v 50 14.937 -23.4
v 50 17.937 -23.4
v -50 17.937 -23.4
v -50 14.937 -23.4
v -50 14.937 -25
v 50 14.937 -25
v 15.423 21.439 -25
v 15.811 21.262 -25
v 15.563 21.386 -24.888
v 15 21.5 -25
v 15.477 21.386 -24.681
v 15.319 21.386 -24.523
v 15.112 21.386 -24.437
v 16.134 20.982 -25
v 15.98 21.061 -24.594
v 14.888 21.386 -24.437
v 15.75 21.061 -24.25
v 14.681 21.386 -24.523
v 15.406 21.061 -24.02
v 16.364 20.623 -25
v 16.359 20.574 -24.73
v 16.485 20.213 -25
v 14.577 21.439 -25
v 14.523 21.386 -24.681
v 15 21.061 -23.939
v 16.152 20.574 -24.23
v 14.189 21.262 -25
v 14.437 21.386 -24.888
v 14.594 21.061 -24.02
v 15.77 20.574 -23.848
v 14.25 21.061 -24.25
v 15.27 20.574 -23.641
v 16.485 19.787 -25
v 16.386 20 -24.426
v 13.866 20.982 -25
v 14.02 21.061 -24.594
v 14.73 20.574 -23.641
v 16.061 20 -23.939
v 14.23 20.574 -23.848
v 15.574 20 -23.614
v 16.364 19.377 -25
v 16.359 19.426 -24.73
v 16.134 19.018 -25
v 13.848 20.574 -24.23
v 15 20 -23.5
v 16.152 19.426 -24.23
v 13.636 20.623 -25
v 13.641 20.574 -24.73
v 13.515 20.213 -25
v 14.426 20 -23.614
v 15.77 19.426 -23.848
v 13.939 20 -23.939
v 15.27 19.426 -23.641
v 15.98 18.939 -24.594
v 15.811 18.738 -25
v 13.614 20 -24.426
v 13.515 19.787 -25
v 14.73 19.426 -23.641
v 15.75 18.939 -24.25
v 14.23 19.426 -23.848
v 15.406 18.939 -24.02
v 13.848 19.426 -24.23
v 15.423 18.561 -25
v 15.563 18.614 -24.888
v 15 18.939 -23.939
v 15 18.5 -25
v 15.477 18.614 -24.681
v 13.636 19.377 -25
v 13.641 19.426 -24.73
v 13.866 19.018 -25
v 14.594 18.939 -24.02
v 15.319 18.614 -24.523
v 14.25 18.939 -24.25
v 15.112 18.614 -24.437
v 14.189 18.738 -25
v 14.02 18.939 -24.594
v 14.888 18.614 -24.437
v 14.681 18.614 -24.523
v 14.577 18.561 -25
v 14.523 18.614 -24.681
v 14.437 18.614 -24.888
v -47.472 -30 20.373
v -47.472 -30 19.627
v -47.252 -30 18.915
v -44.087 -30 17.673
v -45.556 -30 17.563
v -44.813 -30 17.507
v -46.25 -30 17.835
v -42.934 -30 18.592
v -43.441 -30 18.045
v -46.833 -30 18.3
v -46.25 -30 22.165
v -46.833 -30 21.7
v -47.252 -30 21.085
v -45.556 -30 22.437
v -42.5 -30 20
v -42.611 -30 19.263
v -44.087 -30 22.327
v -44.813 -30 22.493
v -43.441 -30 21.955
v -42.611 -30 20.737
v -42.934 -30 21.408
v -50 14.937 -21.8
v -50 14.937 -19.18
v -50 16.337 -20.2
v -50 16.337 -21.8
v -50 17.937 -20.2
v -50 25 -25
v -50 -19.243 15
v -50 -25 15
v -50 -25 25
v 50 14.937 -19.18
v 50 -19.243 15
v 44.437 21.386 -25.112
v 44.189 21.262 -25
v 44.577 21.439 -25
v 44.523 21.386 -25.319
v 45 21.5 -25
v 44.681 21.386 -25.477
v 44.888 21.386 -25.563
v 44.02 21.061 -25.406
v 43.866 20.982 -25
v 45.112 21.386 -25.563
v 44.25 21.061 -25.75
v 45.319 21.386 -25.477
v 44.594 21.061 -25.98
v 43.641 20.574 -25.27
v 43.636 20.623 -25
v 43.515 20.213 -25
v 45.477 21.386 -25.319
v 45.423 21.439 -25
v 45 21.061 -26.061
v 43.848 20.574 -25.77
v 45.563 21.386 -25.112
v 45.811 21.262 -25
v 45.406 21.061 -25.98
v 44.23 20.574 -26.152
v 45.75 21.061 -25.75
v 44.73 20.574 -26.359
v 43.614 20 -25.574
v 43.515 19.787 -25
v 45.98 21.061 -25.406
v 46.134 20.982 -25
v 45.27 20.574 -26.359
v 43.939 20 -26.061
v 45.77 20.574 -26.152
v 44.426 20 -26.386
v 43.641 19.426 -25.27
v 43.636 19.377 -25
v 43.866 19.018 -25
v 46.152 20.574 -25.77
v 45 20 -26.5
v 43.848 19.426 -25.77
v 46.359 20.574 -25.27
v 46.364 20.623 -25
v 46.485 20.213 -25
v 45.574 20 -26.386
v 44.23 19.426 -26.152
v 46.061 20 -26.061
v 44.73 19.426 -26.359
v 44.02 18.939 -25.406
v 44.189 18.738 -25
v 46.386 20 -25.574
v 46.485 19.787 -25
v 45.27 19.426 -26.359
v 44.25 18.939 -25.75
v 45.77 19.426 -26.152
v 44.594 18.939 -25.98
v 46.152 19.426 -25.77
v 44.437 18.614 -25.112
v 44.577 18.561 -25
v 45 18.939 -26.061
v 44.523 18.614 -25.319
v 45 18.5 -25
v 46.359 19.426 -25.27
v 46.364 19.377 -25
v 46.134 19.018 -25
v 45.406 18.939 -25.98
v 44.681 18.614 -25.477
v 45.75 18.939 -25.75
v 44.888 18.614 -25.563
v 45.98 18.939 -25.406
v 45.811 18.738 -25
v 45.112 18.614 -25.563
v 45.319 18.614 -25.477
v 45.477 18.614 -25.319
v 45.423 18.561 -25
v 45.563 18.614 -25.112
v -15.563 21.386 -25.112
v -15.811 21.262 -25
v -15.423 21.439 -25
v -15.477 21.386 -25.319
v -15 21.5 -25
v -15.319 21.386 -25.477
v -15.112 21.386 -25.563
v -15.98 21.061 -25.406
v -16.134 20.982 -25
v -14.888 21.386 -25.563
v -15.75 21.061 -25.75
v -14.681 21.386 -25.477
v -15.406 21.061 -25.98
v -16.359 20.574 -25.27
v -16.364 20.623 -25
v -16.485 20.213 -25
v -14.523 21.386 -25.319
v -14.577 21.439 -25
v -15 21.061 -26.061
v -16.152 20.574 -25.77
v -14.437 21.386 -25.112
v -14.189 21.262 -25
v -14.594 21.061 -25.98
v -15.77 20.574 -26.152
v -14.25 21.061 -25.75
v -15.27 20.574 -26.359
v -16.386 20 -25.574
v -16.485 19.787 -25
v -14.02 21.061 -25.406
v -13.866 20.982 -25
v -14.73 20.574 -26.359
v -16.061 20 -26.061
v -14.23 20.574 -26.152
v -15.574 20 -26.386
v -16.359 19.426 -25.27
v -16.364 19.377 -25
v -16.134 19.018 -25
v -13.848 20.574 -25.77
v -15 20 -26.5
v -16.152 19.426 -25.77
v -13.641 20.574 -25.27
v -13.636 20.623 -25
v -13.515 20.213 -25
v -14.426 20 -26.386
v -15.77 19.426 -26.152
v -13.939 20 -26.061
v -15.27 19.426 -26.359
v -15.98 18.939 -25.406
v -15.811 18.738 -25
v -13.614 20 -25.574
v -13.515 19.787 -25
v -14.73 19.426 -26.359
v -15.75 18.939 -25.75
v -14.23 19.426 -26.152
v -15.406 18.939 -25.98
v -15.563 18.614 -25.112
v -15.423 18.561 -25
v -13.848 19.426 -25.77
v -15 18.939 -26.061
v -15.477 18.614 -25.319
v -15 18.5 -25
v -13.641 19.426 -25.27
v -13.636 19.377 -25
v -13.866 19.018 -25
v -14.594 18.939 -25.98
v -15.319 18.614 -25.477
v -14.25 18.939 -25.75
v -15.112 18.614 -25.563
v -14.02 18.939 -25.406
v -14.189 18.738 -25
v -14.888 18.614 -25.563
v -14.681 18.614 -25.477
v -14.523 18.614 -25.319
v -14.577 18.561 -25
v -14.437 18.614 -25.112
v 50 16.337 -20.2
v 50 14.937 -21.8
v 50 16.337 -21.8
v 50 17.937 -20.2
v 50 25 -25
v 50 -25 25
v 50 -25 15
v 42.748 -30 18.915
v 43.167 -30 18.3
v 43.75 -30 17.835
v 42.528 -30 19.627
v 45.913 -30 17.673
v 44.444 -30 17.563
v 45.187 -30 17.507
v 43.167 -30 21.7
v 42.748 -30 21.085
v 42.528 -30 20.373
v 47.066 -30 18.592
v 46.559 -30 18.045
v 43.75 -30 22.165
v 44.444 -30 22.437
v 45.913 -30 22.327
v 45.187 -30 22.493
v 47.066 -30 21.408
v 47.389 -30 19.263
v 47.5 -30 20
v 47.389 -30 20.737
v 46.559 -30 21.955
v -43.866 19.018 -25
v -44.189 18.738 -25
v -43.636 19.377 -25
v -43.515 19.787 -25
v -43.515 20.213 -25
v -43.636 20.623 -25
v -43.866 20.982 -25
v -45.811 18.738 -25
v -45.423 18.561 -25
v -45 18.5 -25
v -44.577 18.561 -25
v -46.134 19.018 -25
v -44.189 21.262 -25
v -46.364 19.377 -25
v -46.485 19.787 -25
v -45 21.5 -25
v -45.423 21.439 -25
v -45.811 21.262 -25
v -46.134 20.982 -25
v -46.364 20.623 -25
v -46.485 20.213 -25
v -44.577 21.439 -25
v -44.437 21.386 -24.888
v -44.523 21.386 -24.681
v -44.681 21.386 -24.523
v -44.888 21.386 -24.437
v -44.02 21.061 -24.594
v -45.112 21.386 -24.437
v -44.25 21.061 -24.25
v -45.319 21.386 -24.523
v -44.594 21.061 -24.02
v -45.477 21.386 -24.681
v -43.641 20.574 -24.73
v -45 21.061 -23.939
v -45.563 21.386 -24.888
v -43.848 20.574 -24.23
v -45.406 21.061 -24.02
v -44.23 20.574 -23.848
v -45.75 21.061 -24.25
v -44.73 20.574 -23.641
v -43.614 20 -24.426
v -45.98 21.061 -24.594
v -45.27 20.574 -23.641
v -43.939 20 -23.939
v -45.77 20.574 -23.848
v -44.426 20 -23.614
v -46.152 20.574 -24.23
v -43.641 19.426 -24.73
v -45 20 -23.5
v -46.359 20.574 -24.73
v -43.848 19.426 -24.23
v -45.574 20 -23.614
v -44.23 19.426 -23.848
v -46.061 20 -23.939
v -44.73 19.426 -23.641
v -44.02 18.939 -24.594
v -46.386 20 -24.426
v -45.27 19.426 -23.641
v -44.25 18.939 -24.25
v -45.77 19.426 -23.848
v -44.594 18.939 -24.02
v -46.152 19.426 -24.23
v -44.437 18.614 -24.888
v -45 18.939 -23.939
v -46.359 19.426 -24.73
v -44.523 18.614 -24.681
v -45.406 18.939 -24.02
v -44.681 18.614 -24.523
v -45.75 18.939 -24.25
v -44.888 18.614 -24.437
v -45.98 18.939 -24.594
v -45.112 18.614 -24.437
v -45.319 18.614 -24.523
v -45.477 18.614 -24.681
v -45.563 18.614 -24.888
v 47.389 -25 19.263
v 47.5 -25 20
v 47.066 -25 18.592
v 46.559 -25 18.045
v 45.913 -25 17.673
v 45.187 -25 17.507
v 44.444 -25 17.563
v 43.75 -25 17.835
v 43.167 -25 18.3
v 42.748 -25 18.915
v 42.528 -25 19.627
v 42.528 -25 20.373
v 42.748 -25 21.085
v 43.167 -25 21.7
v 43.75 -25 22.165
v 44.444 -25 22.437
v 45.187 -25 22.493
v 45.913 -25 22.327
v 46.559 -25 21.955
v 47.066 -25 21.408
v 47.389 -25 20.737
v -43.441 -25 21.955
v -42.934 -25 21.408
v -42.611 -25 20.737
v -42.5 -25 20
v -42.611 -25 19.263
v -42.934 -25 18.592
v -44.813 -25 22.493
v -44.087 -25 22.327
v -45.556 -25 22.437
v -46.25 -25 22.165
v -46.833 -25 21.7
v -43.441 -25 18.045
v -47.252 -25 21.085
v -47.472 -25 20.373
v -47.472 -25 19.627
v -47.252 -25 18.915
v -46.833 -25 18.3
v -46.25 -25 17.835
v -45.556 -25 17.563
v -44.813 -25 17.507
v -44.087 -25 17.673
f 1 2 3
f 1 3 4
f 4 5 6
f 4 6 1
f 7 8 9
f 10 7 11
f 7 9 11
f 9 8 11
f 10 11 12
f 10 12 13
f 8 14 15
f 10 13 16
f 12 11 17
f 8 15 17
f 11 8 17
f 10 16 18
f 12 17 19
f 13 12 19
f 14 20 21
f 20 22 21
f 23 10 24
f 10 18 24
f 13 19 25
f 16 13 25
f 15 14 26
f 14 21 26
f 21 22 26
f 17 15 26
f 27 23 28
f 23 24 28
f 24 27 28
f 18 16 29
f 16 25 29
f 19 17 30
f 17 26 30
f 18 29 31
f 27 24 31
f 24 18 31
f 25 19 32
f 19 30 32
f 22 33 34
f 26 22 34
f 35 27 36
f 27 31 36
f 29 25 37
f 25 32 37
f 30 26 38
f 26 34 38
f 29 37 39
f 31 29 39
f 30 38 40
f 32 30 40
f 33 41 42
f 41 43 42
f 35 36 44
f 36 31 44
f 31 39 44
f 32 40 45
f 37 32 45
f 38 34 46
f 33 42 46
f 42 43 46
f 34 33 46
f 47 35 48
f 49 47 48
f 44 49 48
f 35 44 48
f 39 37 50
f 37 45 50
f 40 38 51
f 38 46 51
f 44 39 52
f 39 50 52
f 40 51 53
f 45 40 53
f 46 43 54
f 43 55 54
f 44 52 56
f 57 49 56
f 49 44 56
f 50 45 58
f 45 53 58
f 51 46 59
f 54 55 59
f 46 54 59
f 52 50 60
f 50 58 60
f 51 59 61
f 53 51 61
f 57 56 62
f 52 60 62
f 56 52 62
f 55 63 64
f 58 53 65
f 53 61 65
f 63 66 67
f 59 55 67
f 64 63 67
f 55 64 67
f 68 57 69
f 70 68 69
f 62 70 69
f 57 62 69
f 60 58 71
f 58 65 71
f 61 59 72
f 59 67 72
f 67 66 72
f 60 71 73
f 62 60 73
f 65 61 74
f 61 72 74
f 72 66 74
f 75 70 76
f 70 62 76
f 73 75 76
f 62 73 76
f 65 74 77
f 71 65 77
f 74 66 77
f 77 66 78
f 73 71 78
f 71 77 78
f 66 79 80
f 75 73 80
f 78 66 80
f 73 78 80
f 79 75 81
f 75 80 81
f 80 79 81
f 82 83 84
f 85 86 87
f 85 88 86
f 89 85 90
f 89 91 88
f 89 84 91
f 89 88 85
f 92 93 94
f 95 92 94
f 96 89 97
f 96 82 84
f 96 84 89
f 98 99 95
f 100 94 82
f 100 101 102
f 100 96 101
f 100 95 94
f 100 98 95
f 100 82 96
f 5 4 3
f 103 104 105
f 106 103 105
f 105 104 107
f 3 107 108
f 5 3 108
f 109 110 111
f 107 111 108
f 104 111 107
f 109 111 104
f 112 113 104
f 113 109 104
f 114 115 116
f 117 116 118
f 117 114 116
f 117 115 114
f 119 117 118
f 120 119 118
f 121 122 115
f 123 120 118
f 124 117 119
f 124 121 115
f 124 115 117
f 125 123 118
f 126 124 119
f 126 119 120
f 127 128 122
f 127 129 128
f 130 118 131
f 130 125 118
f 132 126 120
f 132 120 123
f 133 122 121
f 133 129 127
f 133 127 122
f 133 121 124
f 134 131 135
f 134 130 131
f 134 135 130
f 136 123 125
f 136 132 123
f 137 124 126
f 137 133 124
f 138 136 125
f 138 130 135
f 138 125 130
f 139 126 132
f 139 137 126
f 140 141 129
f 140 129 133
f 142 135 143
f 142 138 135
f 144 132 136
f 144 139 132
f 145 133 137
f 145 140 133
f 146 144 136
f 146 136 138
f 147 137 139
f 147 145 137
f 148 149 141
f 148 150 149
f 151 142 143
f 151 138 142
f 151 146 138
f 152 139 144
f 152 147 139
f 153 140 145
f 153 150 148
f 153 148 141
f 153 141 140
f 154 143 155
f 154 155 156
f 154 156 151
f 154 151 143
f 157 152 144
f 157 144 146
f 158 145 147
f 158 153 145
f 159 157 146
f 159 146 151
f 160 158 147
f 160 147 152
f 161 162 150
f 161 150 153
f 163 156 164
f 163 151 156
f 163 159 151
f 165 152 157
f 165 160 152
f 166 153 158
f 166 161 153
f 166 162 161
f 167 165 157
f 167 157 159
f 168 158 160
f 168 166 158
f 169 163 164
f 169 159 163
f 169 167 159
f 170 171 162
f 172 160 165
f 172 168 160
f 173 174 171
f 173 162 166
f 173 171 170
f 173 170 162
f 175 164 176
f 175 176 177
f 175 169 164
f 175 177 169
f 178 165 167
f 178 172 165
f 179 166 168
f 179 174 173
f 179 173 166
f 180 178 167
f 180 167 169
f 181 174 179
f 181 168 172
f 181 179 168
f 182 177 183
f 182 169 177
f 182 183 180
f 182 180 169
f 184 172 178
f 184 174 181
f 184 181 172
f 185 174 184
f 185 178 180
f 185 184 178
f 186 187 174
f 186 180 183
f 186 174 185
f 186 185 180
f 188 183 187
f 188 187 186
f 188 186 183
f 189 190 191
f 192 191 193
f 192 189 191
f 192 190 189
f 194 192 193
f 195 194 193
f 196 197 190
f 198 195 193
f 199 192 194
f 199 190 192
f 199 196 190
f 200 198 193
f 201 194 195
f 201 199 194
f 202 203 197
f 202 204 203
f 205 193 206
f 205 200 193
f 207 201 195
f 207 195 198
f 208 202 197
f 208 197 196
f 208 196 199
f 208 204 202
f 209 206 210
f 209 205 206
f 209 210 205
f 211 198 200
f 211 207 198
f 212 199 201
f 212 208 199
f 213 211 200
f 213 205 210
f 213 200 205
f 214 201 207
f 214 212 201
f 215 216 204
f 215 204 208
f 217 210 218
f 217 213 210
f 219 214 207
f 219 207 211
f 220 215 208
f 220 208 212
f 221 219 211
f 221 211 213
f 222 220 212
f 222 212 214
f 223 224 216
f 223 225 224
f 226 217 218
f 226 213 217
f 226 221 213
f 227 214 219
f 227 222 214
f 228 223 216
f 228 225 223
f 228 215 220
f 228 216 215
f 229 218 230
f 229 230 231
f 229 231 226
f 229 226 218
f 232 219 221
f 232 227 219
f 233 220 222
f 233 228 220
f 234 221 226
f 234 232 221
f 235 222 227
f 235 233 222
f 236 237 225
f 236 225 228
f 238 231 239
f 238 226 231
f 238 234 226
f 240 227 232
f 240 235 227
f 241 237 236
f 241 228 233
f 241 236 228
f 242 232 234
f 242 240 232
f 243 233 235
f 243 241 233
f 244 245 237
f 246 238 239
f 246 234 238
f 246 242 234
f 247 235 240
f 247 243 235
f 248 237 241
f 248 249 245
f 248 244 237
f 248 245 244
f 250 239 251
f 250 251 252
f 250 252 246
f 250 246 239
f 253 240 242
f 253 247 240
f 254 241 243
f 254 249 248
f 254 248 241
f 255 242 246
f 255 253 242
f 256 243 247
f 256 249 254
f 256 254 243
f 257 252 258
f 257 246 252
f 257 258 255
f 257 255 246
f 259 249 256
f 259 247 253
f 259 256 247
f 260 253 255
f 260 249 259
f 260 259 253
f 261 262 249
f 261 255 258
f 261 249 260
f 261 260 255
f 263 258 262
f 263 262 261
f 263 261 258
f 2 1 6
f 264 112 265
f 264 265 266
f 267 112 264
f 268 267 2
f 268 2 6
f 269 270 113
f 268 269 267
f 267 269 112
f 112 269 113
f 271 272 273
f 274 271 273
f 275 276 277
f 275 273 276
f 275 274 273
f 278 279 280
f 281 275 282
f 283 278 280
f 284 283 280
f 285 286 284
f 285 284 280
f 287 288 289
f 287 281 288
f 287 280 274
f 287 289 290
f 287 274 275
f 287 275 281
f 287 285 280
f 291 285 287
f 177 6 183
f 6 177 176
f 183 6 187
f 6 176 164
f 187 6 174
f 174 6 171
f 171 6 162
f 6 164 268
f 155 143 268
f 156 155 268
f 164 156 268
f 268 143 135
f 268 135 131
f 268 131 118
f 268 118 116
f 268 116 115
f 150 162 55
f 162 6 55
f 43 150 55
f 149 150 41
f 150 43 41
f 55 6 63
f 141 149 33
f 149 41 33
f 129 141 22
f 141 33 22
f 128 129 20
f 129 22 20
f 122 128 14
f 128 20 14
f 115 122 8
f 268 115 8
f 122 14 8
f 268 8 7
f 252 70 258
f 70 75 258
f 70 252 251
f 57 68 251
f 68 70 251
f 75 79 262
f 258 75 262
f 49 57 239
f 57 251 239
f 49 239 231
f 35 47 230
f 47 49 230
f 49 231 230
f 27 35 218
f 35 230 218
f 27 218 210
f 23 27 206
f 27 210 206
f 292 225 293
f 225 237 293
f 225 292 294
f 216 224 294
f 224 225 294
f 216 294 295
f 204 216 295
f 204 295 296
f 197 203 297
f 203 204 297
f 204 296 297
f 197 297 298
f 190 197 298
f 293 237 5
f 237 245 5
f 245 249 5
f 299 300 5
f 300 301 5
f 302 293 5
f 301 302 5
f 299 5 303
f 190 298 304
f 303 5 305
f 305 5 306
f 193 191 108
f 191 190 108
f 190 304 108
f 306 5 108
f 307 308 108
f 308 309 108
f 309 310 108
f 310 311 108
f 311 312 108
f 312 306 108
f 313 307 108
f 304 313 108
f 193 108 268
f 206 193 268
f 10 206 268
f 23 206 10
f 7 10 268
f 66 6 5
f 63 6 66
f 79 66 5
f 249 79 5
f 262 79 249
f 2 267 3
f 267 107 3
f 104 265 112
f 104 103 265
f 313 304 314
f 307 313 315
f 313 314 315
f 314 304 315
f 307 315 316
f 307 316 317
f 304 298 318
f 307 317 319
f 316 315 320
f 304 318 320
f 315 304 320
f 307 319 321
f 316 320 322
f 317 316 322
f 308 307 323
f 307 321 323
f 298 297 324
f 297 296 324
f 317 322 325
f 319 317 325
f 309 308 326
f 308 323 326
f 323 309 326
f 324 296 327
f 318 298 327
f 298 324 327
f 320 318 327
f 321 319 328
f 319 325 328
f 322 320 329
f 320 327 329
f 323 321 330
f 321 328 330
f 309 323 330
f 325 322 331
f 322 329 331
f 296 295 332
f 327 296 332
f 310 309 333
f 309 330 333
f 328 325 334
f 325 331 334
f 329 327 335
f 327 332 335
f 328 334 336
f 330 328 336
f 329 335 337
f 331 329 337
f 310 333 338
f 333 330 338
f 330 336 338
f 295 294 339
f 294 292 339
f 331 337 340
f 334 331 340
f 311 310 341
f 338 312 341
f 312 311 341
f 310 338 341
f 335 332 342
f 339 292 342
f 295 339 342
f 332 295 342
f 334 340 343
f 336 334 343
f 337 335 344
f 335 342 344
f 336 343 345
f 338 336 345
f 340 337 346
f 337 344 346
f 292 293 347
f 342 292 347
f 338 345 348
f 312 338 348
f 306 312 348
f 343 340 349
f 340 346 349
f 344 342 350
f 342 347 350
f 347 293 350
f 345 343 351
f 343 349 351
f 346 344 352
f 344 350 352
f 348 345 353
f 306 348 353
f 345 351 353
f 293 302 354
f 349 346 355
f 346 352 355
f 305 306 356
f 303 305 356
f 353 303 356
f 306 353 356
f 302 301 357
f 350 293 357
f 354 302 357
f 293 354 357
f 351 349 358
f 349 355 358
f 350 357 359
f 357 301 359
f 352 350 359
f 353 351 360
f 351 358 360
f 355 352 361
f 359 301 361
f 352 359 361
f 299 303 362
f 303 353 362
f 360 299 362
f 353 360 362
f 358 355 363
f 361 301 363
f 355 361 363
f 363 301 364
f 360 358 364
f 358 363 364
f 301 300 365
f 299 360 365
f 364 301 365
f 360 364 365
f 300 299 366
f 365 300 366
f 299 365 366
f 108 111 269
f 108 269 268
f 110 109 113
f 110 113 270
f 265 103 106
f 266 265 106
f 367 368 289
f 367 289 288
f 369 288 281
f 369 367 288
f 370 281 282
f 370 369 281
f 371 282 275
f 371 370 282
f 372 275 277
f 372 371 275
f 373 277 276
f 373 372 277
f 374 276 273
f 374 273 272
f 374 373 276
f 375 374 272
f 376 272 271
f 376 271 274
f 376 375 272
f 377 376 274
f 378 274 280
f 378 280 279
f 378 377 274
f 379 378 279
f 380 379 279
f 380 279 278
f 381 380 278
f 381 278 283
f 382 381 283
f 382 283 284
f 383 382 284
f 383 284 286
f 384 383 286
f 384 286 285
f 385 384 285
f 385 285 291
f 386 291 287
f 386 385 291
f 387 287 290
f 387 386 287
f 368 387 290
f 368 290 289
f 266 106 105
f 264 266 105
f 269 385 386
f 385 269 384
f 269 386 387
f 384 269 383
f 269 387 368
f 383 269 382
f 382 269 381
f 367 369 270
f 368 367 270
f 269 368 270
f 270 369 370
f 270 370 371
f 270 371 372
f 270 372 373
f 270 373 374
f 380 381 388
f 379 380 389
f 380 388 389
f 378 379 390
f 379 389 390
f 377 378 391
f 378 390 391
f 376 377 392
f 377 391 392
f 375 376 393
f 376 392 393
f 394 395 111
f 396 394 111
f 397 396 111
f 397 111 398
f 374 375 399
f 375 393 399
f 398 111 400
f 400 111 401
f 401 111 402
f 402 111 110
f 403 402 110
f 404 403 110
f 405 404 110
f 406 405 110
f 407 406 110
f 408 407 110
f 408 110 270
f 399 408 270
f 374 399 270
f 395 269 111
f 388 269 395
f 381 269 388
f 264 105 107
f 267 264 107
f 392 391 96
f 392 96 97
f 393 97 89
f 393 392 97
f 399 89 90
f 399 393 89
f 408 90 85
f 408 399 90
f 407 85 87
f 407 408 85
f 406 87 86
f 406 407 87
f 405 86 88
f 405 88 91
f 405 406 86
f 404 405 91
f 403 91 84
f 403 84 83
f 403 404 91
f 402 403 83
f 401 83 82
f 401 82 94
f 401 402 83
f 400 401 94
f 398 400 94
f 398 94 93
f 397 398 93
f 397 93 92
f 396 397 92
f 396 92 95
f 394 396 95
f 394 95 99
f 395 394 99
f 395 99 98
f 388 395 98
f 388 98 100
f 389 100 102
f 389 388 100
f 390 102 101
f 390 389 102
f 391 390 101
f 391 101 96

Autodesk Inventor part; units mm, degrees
sketch "Sketch1" plane through (0, 0, 0) normal (1, 0, 0) x (0, 1, 0)
  line L0 (25, 25) -> (-25, 25)
  line L1 (-25, 25) -> (-25, -25)
  line L2 (-25, -25) -> (25, -25)
  line L3 (25, -25) -> (25, 25)
  line L4 (-35, 0) -> (35, 0) projected
  line L5 (0, 35) -> (0, -35) projected
  line L6 (-25, 25) -> (25, -25)
  line L7 (-19.2426, 15) -> (14.9373, -19.1799)
  line L8 (-19.2426, 15) -> (-25, 15)
  line L9 (14.9373, -25) -> (14.9373, -19.1799)
  line L10 (14.9373, -21.8) -> (17.9373, -21.8)
  line L11 (17.9373, -21.8) -> (17.9373, -23.4)
  line L12 (17.9373, -23.4) -> (14.9373, -23.4)
  line L13 (14.9373, -23.4) -> (14.9373, -21.8)
  line L14 (17.9373, -21.8) -> (16.3373, -21.8)
  line L15 (16.3373, -21.8) -> (16.3373, -20.2)
  line L16 (16.3373, -20.2) -> (17.9373, -20.2)
  line L17 (17.9373, -20.2) -> (17.9373, -21.8)
  point P0 (0, 0)
  point P1 (25, 0)
  point P2 (0, 25)
  point P3 (20.7574, -25)
  point P4 (-25, 20.7574)
  point P5 (0, 0)
  point P6 (0, 0)
  point P7 (0, -4.2426)
  point P8 (-4.2426, 0)
  dimension "d0" = 50
  dimension "d1" = 50
  dimension "d2" = 3
  dimension "d5" = 10
  dimension "d92" = 3
  dimension "d93" = 1.6
  dimension "d94" = 1.6
  dimension "d95" = 1.6
  dimension "d96" = 1.6
  dimension "d97" = 1.6
extrude "Extrusion1" add sketch "Sketch1" along normal mid plane 100 contours L6 L4 L7 L8 L1 | L5 L7 L4 | L6 L2 L9 L12 L11 L17 L16 L15 L10 L7 L5
sketch "Sketch4" plane through (50, 25, -25) normal (0, 0, -1) x (-1, 0, 0)
  circle A0 centre (5, -5) radius 1.5
  line L0 (0, -10.0627) -> (0, 0) projected
  line L1 (0, 0) -> (100, 0) projected
  line L2 (5, -3.5) -> (5, -6.5)
  circle A1 centre (35, -5) radius 1.5
  line L3 (35, -3.5) -> (35, -6.5)
  circle A2 centre (65, -5) radius 1.5
  line L4 (65, -3.5) -> (65, -6.5)
  circle A3 centre (95, -5) radius 1.5
  line L5 (95, -3.5) -> (95, -6.5)
  point P0 (50, -25)
  point P1 (0, -50)
  dimension "d45" = 3
  dimension "d46" = 5
  dimension "d47" = 5
  dimension "d48" = 3
  dimension "d98" = 3
  dimension "d99" = 5
  dimension "d100" = 30
  dimension "d101" = 3
  dimension "d104" = 60
revolve "Revolution2" add sketch "Sketch4" angle 360 about axis through (45, 21.5, -25) along (0, -1, 0) picked at (4.5036, -4.9397) contours L2 A0
revolve "Revolution3" cut sketch "Sketch4" angle 360 about axis through (15, 21.5, -25) along (0, -1, 0) picked at (34.5036, -5.0603) contours L3 A1
revolve "Revolution4" add sketch "Sketch4" angle 360 about axis through (-15, 21.5, -25) along (0, -1, 0) picked at (64.2365, -5.2413) contours L4 A2
revolve "Revolution5" cut sketch "Sketch4" angle 360 about axis through (-45, 21.5, -25) along (0, -1, 0) picked at (94.1238, -4.716) contours L5 A3
sketch "Sketch5" plane through (-50, -25, 15) normal (0, -1, 0) x (1, 0, 0)
  circle A0 centre (5, 5) radius 2.5
  line L0 (0, 0) -> (0, 10) projected
  line L1 (0, 10) -> (100, 10) projected
  line L2 (50, 20) -> (50, -50) projected
  circle A1 centre (95, 5) radius 2.5
  line L3 (0, 5) -> (100, 5)
  line L4 (100, -40) -> (100, 10) projected
  point P0 (50, -15)
  dimension "d73" = 5
  dimension "d74" = 5
extrude "Extrusion3" add sketch "Sketch5" along normal blind 5 contours L3 A0 | A0 L3 | L3 A1 | A1 L3
properties part number "Roof_Small"
